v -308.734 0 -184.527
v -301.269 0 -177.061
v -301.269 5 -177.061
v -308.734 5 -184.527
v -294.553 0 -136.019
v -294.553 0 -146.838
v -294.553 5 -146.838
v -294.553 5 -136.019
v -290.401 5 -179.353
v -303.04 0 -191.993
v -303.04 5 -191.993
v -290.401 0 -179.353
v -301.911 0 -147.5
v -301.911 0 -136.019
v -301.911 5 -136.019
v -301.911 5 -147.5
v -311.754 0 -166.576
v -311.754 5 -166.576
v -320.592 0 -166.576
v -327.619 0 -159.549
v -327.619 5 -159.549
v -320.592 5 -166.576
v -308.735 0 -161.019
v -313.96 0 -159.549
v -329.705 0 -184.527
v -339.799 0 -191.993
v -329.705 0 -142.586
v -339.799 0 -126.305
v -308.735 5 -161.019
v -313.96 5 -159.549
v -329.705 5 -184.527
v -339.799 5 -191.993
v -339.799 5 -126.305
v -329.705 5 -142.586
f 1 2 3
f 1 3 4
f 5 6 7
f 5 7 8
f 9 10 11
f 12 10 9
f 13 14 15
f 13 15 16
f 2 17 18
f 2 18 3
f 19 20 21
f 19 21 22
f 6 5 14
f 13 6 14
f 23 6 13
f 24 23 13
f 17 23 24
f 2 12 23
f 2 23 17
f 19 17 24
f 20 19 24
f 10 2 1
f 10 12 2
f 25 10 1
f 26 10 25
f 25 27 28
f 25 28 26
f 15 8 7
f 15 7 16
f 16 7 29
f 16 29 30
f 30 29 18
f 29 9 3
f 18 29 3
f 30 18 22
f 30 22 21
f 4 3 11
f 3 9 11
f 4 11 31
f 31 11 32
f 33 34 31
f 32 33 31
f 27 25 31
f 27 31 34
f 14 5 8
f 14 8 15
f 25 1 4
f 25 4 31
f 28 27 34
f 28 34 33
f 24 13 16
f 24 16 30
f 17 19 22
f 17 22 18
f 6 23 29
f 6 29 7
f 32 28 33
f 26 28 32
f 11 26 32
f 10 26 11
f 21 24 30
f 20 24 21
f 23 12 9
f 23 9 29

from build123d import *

# Parameters (mm, degrees)
BOSS_EXTRUDE1_DEPTH = 5


with BuildPart() as part:
    # Sketch1 → Boss-Extrude1 (new body)
    with BuildSketch(Plane(origin=(0, 0, 0), x_dir=(1, 0, 0), z_dir=(0, 1, 0))):
        Polygon((-339.799413006, 126.304683991), (-339.799413006, 191.992892094), (-303.040106148, 191.992892094), (-290.400599698, 179.353385644), (-308.734522065, 161.019463277), (-294.552751732, 146.837692944), (-294.552751732, 136.018956443), (-301.910980799, 136.018956443), (-301.910980799, 147.500427473), (-313.95979318, 159.549239854), (-327.618746258, 159.549239854), (-320.592033082, 166.575953029), (-311.753745416, 166.575953029), (-301.268571849, 177.061126596), (-308.734454598, 184.527009345), (-329.704801732, 184.527009345), (-329.704801732, 142.586315078), align=None)
    extrude(amount=BOSS_EXTRUDE1_DEPTH)


solid = part.part
